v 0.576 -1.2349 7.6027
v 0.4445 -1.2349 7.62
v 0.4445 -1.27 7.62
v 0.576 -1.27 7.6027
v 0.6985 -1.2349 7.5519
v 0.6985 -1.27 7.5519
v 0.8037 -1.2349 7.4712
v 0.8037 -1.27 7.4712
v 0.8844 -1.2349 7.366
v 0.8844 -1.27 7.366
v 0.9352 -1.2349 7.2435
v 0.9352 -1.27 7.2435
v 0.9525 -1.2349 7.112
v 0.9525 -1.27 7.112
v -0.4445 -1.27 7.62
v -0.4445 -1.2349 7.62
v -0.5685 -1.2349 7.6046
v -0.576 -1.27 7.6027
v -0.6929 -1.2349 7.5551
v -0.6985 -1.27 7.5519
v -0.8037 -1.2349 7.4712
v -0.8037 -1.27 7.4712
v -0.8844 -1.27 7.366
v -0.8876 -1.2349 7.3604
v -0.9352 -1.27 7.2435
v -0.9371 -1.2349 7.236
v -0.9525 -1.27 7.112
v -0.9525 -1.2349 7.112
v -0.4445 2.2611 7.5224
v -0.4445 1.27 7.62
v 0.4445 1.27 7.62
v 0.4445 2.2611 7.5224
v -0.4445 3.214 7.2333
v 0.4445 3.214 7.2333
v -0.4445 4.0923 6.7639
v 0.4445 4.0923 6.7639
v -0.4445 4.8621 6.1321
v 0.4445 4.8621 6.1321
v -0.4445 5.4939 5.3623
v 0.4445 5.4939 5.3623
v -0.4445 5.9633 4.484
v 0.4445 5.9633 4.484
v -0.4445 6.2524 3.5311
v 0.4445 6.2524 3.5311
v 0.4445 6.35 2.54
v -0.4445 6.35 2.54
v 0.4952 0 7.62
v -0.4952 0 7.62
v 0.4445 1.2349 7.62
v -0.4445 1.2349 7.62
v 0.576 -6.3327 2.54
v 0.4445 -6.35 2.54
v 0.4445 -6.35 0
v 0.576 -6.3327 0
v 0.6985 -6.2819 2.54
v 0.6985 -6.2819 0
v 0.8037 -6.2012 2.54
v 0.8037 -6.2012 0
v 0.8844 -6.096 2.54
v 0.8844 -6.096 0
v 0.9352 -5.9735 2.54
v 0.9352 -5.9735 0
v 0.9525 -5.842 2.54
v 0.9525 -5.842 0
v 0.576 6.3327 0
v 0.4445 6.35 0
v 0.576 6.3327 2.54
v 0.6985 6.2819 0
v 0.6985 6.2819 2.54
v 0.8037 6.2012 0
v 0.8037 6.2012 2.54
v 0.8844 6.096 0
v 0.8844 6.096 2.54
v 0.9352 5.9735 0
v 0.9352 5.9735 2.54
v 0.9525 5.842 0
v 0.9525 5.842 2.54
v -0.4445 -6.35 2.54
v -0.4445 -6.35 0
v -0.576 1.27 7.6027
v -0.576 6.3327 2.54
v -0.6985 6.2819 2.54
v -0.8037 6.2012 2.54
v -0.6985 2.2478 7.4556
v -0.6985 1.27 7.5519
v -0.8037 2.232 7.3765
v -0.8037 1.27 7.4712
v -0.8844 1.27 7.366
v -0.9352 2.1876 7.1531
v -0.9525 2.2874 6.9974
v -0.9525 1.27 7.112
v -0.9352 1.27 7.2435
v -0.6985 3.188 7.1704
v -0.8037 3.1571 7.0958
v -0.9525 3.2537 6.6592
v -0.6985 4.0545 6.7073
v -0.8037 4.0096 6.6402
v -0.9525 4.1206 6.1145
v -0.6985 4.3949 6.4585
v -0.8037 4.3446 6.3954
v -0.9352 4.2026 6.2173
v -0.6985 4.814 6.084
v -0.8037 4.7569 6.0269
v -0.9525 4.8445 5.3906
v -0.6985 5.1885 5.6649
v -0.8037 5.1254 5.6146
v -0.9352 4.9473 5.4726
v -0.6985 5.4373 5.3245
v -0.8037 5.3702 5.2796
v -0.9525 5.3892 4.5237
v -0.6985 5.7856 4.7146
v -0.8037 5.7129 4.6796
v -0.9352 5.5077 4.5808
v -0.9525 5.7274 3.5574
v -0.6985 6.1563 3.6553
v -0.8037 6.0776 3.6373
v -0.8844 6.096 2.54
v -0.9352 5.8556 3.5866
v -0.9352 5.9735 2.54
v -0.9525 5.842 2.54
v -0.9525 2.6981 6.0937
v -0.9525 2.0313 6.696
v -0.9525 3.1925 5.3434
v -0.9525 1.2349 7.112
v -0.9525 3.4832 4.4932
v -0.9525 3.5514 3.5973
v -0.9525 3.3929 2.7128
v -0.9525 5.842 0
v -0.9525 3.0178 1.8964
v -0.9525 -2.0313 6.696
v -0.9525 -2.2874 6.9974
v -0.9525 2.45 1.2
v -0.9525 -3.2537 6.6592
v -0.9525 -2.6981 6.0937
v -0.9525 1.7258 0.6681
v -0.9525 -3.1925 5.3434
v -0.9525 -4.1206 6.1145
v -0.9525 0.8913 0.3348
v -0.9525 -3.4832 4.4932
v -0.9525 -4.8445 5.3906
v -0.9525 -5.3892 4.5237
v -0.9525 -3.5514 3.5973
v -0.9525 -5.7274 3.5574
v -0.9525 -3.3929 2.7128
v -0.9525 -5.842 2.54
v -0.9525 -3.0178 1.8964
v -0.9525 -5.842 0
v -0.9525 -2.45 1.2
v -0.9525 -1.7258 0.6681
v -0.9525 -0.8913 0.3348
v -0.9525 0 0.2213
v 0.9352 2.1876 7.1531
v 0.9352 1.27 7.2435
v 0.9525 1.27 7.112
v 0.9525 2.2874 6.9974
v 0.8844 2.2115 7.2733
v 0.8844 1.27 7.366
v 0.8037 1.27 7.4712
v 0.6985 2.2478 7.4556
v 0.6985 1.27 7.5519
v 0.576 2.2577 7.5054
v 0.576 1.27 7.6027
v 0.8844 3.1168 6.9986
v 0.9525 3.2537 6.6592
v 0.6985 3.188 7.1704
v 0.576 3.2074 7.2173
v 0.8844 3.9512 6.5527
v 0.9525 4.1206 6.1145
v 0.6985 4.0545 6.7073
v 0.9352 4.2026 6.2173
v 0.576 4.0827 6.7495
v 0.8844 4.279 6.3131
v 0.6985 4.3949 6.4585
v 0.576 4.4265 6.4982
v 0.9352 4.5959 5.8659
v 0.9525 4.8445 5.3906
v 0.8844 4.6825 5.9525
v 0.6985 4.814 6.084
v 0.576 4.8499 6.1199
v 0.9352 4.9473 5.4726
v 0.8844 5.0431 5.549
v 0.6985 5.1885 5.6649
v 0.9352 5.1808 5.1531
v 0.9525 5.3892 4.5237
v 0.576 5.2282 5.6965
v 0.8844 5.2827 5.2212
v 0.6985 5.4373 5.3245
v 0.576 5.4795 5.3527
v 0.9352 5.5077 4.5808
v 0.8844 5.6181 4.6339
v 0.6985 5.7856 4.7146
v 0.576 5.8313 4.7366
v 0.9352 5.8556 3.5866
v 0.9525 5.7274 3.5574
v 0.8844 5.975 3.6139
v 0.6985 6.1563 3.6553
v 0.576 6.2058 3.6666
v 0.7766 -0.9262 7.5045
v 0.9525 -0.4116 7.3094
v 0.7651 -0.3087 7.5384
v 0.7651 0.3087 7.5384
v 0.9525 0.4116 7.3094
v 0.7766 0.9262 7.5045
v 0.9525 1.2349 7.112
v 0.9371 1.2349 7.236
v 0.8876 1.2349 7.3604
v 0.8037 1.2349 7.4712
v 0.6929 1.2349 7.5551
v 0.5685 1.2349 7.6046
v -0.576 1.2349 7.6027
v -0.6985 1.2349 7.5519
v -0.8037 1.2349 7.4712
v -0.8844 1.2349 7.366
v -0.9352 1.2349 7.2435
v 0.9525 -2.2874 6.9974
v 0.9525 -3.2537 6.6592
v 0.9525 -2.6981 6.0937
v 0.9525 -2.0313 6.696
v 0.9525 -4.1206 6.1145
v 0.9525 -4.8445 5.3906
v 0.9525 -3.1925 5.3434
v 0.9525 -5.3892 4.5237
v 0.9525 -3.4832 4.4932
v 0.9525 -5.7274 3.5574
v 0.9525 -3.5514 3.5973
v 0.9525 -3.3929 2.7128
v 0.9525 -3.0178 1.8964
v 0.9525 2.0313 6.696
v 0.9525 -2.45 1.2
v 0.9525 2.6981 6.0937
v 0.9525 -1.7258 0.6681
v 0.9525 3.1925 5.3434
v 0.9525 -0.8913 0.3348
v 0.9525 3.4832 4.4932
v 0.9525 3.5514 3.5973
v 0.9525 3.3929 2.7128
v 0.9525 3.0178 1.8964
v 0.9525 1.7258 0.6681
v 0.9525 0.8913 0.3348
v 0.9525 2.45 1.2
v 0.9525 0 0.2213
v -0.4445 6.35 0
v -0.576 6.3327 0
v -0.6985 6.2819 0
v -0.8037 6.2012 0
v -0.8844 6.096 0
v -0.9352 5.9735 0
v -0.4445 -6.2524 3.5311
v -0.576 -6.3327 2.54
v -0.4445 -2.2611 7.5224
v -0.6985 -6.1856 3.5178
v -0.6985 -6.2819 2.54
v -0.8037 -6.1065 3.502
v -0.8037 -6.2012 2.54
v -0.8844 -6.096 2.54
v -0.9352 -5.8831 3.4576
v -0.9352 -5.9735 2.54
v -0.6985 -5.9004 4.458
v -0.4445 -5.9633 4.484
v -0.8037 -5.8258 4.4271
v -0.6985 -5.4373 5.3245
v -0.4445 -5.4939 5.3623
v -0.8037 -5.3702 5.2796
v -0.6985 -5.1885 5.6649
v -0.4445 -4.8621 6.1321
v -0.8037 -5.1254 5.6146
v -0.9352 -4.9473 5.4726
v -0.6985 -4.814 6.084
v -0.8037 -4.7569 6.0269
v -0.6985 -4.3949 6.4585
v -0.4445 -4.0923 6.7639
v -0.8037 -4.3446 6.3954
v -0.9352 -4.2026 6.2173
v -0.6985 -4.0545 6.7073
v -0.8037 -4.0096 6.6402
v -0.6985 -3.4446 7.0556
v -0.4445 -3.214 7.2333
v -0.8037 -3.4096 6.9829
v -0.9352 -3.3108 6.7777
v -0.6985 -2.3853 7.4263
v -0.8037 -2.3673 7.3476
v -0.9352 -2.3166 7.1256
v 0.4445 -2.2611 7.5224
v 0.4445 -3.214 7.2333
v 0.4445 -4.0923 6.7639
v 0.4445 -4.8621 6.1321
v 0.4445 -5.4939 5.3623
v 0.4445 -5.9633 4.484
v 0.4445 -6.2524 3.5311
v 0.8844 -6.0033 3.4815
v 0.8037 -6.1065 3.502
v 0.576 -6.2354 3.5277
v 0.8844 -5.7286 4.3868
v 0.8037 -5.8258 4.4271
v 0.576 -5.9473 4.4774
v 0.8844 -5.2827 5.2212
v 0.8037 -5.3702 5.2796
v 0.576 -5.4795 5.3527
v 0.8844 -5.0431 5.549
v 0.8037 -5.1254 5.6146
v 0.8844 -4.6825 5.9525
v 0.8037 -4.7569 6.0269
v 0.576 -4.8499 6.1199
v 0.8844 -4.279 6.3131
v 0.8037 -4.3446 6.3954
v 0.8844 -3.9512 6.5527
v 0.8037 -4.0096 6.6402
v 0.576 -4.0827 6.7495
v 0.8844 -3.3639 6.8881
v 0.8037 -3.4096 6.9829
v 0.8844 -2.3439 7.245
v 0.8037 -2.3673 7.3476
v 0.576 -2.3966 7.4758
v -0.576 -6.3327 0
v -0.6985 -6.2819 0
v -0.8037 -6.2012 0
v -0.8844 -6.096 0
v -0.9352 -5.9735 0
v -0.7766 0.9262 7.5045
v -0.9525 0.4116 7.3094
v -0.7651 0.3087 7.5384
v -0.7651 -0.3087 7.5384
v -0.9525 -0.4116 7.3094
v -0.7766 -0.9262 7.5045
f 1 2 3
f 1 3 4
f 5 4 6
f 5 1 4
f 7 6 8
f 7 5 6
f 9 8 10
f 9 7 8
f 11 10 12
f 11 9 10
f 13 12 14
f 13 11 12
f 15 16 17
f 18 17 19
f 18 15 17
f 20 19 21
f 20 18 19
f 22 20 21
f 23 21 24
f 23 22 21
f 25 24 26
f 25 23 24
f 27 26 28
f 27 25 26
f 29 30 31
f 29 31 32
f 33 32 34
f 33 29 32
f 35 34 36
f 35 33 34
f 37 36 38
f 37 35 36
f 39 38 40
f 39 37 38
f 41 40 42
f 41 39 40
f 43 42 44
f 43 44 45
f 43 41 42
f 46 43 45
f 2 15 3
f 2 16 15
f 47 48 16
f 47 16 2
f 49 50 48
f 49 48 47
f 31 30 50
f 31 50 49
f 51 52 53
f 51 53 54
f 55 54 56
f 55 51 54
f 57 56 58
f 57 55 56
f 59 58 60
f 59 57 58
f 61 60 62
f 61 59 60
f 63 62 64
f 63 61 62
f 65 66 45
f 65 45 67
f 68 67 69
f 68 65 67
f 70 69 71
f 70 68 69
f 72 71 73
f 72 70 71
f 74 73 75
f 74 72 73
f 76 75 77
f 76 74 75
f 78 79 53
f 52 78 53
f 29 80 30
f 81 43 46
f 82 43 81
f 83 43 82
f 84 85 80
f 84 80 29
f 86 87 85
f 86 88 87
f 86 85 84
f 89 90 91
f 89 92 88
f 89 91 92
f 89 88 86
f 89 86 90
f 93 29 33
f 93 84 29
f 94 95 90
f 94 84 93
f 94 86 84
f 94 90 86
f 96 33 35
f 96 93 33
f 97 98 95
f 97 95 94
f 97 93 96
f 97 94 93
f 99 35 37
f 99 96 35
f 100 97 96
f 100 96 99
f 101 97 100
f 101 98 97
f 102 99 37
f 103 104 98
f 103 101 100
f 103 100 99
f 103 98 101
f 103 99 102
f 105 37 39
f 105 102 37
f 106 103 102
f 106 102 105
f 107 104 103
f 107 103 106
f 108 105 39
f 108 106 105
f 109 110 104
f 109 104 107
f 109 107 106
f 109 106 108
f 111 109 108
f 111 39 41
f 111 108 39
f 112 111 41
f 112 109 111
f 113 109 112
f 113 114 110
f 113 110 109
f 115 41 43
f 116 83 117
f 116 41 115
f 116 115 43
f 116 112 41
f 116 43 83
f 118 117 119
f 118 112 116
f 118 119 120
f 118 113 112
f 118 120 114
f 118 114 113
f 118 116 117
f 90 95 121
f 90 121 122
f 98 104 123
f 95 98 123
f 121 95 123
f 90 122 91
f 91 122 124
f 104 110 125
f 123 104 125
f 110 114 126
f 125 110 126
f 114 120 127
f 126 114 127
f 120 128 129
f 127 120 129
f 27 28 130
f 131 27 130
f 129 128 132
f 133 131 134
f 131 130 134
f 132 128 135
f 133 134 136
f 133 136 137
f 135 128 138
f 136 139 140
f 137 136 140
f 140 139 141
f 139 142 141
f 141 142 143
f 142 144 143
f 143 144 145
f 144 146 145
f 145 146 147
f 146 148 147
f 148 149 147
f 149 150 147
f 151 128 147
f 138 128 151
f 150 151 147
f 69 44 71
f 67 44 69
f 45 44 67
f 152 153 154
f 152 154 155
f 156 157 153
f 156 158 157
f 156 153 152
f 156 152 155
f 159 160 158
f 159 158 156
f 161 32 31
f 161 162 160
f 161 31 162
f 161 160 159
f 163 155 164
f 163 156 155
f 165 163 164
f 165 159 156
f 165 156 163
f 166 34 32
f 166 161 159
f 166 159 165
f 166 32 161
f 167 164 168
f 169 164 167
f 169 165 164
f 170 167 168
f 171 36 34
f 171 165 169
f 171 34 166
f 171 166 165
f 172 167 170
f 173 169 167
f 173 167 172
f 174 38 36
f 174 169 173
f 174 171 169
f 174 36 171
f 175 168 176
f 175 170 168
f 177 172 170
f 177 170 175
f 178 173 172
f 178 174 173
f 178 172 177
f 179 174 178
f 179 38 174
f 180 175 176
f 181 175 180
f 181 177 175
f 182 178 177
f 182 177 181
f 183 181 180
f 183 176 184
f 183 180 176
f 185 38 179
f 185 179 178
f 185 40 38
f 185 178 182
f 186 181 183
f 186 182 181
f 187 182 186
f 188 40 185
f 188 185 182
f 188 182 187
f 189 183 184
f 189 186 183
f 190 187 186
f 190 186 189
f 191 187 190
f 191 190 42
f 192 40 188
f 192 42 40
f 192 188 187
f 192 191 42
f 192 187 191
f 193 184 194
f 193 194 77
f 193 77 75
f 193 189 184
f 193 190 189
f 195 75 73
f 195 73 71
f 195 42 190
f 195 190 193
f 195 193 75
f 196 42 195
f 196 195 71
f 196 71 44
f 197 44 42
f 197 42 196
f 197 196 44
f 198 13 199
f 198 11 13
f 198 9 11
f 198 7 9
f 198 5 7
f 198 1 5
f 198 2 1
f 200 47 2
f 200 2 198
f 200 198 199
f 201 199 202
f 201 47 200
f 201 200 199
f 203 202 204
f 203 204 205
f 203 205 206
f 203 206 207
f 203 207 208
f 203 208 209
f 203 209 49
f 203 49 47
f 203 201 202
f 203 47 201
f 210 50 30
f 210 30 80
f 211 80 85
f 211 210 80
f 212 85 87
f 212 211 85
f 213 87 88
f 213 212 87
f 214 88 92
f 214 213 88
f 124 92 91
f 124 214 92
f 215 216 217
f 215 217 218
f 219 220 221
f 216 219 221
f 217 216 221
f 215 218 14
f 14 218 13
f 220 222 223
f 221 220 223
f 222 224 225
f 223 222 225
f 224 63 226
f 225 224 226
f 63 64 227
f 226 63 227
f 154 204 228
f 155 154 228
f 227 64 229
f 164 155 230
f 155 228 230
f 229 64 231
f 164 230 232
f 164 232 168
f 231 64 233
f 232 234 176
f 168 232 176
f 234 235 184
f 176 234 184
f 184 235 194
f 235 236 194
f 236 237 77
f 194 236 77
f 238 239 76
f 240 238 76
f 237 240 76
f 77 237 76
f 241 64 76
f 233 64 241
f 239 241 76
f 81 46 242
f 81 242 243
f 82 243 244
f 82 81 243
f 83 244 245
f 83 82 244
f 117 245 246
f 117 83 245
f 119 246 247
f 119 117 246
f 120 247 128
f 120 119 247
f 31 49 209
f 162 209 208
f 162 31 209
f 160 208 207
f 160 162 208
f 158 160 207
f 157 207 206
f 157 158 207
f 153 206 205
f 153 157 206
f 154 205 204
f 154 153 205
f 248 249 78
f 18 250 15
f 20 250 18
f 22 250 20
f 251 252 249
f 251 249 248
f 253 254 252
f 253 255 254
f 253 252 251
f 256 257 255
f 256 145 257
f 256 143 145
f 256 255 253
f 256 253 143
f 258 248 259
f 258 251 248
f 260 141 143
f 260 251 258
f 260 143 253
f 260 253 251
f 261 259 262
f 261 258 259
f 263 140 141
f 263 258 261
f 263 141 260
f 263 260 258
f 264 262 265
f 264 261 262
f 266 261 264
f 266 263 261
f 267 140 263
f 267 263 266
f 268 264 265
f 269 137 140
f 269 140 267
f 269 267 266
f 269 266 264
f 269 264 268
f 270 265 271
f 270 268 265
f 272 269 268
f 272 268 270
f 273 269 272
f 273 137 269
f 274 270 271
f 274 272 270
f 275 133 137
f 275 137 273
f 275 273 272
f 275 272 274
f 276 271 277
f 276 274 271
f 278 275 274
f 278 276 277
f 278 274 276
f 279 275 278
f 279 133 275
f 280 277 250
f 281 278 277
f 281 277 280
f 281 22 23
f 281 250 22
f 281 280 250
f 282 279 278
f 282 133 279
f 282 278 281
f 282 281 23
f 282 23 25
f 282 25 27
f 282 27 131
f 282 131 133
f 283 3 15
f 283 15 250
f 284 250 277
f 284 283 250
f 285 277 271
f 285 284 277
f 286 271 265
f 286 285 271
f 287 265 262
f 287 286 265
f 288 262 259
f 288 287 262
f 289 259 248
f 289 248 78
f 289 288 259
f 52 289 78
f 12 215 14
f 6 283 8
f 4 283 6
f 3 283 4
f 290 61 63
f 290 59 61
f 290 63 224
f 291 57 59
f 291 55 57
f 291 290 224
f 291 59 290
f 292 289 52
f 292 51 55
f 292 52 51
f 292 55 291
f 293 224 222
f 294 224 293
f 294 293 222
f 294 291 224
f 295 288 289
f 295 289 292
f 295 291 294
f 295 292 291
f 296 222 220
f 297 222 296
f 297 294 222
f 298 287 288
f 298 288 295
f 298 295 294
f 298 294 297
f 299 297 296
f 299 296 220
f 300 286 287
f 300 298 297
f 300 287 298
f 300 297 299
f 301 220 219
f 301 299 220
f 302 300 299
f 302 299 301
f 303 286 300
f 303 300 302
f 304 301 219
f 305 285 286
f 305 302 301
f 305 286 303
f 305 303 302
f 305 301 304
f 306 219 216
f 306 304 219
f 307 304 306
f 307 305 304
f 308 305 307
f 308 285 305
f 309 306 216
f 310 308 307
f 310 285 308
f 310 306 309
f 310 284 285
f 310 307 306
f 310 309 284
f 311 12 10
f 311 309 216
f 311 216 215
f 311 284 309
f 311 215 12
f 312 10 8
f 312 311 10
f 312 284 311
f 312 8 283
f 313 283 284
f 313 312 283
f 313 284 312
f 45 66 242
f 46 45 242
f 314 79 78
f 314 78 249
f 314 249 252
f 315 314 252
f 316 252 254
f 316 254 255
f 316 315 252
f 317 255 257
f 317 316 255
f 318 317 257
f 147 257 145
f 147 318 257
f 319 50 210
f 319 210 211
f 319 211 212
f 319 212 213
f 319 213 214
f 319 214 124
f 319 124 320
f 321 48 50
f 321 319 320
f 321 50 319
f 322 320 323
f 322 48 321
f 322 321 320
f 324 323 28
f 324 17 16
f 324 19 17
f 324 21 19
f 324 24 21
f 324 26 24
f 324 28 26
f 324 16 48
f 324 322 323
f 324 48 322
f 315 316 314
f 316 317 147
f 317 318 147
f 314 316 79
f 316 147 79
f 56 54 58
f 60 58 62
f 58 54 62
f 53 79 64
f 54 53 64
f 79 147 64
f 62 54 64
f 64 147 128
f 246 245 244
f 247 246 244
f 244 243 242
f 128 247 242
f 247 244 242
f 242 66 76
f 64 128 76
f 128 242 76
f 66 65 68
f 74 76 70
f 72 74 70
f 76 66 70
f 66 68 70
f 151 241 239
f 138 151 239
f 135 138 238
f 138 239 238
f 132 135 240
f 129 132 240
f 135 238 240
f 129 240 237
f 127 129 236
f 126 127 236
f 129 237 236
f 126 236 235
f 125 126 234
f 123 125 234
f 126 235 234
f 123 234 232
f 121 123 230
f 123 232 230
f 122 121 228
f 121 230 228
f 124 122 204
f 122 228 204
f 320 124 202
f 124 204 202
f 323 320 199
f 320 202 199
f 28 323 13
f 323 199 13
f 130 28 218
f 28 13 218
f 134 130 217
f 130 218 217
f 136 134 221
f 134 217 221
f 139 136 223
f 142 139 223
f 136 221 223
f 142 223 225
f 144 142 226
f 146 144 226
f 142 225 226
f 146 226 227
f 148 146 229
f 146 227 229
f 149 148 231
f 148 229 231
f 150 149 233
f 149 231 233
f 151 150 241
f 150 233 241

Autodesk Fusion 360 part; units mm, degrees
sketch "Sketch1" plane through (0, 0, 0) normal (0, 0, 1) x (1, 0, 0)
  line L0 (0.9525, 6.35) -> (-0.9525, 6.35)
  line L1 (-0.9525, 6.35) -> (-0.9525, -6.35)
  line L2 (-0.9525, -6.35) -> (0.9525, -6.35)
  line L3 (0.9525, -6.35) -> (0.9525, 6.35)
  line L4 (0.9525, 6.35) -> (-0.9525, -6.35) construction
  line L5 (-0.9525, 6.35) -> (0.9525, -6.35) construction
  dimension "d7" = 1.905
  dimension "d8" = 12.7
extrude "Extrude1" add sketch "Sketch1" along normal blind 7.62
sketch "Sketch2" plane through (0.9525, 0, 0) normal (1, 0, 0) x (0, 0, -1)
  line L0 (0, -6.35) -> (0, 6.35)
  line L1 (0, 6.35) -> (-7.62, 6.35)
  line L2 (-7.62, 6.35) -> (-7.62, -6.35)
  line L3 (-7.62, -6.35) -> (0, -6.35)
  circle A0 centre (-3.7773, 0) radius 3.556
  dimension "d11" = 7.112
extrude "Extrude2" cut sketch "Sketch2" against normal blind 12.7 contours A0
sketch "Sketch3" plane through (0, 0, 0) normal (0, 0, -1) x (-1, 0, 0)
  line L0 (-0.9525, 6.35) -> (-0.9525, -6.35)
  line L1 (-0.9525, -6.35) -> (0.9525, -6.35)
  line L2 (0.9525, -6.35) -> (0.9525, 6.35)
  line L3 (0.9525, 6.35) -> (-0.9525, 6.35)
  point P0 (-0.9525, 0)
fillet "Fillet1" radius 5.08 2 edges at (0, 6.35, 7.62) (0, -6.35, 7.62)
fillet "Fillet2" radius 0.508 10 edges at (0.9525, -6.35, 1.27) (0.9525, -4.8621, 6.1321) (0.9525, 0, 7.62) (0.9525, 4.8621, 6.1321) (0.9525, 6.35, 1.27) (-0.9525, 6.35, 1.27) (-0.9525, 4.8621, 6.1321) (-0.9525, 0, 7.62) (-0.9525, -4.8621, 6.1321) (-0.9525, -6.35, 1.27)
equation "tabHeight = 0.3 in"
equation "tabWidth = 0.5 in"
equation "tabThickness = 0.075 in"
equation "pinSize = 0.25 in"
equation "pinHoleClearance = 0.03 in"
equation "pinHoleDiameter = pinSize + pinHoleClearance"
equation "d7 = tabThickness"
equation "d8 = tabWidth"
equation "d9 = tabHeight"
equation "d11 = pinHoleDiameter"
